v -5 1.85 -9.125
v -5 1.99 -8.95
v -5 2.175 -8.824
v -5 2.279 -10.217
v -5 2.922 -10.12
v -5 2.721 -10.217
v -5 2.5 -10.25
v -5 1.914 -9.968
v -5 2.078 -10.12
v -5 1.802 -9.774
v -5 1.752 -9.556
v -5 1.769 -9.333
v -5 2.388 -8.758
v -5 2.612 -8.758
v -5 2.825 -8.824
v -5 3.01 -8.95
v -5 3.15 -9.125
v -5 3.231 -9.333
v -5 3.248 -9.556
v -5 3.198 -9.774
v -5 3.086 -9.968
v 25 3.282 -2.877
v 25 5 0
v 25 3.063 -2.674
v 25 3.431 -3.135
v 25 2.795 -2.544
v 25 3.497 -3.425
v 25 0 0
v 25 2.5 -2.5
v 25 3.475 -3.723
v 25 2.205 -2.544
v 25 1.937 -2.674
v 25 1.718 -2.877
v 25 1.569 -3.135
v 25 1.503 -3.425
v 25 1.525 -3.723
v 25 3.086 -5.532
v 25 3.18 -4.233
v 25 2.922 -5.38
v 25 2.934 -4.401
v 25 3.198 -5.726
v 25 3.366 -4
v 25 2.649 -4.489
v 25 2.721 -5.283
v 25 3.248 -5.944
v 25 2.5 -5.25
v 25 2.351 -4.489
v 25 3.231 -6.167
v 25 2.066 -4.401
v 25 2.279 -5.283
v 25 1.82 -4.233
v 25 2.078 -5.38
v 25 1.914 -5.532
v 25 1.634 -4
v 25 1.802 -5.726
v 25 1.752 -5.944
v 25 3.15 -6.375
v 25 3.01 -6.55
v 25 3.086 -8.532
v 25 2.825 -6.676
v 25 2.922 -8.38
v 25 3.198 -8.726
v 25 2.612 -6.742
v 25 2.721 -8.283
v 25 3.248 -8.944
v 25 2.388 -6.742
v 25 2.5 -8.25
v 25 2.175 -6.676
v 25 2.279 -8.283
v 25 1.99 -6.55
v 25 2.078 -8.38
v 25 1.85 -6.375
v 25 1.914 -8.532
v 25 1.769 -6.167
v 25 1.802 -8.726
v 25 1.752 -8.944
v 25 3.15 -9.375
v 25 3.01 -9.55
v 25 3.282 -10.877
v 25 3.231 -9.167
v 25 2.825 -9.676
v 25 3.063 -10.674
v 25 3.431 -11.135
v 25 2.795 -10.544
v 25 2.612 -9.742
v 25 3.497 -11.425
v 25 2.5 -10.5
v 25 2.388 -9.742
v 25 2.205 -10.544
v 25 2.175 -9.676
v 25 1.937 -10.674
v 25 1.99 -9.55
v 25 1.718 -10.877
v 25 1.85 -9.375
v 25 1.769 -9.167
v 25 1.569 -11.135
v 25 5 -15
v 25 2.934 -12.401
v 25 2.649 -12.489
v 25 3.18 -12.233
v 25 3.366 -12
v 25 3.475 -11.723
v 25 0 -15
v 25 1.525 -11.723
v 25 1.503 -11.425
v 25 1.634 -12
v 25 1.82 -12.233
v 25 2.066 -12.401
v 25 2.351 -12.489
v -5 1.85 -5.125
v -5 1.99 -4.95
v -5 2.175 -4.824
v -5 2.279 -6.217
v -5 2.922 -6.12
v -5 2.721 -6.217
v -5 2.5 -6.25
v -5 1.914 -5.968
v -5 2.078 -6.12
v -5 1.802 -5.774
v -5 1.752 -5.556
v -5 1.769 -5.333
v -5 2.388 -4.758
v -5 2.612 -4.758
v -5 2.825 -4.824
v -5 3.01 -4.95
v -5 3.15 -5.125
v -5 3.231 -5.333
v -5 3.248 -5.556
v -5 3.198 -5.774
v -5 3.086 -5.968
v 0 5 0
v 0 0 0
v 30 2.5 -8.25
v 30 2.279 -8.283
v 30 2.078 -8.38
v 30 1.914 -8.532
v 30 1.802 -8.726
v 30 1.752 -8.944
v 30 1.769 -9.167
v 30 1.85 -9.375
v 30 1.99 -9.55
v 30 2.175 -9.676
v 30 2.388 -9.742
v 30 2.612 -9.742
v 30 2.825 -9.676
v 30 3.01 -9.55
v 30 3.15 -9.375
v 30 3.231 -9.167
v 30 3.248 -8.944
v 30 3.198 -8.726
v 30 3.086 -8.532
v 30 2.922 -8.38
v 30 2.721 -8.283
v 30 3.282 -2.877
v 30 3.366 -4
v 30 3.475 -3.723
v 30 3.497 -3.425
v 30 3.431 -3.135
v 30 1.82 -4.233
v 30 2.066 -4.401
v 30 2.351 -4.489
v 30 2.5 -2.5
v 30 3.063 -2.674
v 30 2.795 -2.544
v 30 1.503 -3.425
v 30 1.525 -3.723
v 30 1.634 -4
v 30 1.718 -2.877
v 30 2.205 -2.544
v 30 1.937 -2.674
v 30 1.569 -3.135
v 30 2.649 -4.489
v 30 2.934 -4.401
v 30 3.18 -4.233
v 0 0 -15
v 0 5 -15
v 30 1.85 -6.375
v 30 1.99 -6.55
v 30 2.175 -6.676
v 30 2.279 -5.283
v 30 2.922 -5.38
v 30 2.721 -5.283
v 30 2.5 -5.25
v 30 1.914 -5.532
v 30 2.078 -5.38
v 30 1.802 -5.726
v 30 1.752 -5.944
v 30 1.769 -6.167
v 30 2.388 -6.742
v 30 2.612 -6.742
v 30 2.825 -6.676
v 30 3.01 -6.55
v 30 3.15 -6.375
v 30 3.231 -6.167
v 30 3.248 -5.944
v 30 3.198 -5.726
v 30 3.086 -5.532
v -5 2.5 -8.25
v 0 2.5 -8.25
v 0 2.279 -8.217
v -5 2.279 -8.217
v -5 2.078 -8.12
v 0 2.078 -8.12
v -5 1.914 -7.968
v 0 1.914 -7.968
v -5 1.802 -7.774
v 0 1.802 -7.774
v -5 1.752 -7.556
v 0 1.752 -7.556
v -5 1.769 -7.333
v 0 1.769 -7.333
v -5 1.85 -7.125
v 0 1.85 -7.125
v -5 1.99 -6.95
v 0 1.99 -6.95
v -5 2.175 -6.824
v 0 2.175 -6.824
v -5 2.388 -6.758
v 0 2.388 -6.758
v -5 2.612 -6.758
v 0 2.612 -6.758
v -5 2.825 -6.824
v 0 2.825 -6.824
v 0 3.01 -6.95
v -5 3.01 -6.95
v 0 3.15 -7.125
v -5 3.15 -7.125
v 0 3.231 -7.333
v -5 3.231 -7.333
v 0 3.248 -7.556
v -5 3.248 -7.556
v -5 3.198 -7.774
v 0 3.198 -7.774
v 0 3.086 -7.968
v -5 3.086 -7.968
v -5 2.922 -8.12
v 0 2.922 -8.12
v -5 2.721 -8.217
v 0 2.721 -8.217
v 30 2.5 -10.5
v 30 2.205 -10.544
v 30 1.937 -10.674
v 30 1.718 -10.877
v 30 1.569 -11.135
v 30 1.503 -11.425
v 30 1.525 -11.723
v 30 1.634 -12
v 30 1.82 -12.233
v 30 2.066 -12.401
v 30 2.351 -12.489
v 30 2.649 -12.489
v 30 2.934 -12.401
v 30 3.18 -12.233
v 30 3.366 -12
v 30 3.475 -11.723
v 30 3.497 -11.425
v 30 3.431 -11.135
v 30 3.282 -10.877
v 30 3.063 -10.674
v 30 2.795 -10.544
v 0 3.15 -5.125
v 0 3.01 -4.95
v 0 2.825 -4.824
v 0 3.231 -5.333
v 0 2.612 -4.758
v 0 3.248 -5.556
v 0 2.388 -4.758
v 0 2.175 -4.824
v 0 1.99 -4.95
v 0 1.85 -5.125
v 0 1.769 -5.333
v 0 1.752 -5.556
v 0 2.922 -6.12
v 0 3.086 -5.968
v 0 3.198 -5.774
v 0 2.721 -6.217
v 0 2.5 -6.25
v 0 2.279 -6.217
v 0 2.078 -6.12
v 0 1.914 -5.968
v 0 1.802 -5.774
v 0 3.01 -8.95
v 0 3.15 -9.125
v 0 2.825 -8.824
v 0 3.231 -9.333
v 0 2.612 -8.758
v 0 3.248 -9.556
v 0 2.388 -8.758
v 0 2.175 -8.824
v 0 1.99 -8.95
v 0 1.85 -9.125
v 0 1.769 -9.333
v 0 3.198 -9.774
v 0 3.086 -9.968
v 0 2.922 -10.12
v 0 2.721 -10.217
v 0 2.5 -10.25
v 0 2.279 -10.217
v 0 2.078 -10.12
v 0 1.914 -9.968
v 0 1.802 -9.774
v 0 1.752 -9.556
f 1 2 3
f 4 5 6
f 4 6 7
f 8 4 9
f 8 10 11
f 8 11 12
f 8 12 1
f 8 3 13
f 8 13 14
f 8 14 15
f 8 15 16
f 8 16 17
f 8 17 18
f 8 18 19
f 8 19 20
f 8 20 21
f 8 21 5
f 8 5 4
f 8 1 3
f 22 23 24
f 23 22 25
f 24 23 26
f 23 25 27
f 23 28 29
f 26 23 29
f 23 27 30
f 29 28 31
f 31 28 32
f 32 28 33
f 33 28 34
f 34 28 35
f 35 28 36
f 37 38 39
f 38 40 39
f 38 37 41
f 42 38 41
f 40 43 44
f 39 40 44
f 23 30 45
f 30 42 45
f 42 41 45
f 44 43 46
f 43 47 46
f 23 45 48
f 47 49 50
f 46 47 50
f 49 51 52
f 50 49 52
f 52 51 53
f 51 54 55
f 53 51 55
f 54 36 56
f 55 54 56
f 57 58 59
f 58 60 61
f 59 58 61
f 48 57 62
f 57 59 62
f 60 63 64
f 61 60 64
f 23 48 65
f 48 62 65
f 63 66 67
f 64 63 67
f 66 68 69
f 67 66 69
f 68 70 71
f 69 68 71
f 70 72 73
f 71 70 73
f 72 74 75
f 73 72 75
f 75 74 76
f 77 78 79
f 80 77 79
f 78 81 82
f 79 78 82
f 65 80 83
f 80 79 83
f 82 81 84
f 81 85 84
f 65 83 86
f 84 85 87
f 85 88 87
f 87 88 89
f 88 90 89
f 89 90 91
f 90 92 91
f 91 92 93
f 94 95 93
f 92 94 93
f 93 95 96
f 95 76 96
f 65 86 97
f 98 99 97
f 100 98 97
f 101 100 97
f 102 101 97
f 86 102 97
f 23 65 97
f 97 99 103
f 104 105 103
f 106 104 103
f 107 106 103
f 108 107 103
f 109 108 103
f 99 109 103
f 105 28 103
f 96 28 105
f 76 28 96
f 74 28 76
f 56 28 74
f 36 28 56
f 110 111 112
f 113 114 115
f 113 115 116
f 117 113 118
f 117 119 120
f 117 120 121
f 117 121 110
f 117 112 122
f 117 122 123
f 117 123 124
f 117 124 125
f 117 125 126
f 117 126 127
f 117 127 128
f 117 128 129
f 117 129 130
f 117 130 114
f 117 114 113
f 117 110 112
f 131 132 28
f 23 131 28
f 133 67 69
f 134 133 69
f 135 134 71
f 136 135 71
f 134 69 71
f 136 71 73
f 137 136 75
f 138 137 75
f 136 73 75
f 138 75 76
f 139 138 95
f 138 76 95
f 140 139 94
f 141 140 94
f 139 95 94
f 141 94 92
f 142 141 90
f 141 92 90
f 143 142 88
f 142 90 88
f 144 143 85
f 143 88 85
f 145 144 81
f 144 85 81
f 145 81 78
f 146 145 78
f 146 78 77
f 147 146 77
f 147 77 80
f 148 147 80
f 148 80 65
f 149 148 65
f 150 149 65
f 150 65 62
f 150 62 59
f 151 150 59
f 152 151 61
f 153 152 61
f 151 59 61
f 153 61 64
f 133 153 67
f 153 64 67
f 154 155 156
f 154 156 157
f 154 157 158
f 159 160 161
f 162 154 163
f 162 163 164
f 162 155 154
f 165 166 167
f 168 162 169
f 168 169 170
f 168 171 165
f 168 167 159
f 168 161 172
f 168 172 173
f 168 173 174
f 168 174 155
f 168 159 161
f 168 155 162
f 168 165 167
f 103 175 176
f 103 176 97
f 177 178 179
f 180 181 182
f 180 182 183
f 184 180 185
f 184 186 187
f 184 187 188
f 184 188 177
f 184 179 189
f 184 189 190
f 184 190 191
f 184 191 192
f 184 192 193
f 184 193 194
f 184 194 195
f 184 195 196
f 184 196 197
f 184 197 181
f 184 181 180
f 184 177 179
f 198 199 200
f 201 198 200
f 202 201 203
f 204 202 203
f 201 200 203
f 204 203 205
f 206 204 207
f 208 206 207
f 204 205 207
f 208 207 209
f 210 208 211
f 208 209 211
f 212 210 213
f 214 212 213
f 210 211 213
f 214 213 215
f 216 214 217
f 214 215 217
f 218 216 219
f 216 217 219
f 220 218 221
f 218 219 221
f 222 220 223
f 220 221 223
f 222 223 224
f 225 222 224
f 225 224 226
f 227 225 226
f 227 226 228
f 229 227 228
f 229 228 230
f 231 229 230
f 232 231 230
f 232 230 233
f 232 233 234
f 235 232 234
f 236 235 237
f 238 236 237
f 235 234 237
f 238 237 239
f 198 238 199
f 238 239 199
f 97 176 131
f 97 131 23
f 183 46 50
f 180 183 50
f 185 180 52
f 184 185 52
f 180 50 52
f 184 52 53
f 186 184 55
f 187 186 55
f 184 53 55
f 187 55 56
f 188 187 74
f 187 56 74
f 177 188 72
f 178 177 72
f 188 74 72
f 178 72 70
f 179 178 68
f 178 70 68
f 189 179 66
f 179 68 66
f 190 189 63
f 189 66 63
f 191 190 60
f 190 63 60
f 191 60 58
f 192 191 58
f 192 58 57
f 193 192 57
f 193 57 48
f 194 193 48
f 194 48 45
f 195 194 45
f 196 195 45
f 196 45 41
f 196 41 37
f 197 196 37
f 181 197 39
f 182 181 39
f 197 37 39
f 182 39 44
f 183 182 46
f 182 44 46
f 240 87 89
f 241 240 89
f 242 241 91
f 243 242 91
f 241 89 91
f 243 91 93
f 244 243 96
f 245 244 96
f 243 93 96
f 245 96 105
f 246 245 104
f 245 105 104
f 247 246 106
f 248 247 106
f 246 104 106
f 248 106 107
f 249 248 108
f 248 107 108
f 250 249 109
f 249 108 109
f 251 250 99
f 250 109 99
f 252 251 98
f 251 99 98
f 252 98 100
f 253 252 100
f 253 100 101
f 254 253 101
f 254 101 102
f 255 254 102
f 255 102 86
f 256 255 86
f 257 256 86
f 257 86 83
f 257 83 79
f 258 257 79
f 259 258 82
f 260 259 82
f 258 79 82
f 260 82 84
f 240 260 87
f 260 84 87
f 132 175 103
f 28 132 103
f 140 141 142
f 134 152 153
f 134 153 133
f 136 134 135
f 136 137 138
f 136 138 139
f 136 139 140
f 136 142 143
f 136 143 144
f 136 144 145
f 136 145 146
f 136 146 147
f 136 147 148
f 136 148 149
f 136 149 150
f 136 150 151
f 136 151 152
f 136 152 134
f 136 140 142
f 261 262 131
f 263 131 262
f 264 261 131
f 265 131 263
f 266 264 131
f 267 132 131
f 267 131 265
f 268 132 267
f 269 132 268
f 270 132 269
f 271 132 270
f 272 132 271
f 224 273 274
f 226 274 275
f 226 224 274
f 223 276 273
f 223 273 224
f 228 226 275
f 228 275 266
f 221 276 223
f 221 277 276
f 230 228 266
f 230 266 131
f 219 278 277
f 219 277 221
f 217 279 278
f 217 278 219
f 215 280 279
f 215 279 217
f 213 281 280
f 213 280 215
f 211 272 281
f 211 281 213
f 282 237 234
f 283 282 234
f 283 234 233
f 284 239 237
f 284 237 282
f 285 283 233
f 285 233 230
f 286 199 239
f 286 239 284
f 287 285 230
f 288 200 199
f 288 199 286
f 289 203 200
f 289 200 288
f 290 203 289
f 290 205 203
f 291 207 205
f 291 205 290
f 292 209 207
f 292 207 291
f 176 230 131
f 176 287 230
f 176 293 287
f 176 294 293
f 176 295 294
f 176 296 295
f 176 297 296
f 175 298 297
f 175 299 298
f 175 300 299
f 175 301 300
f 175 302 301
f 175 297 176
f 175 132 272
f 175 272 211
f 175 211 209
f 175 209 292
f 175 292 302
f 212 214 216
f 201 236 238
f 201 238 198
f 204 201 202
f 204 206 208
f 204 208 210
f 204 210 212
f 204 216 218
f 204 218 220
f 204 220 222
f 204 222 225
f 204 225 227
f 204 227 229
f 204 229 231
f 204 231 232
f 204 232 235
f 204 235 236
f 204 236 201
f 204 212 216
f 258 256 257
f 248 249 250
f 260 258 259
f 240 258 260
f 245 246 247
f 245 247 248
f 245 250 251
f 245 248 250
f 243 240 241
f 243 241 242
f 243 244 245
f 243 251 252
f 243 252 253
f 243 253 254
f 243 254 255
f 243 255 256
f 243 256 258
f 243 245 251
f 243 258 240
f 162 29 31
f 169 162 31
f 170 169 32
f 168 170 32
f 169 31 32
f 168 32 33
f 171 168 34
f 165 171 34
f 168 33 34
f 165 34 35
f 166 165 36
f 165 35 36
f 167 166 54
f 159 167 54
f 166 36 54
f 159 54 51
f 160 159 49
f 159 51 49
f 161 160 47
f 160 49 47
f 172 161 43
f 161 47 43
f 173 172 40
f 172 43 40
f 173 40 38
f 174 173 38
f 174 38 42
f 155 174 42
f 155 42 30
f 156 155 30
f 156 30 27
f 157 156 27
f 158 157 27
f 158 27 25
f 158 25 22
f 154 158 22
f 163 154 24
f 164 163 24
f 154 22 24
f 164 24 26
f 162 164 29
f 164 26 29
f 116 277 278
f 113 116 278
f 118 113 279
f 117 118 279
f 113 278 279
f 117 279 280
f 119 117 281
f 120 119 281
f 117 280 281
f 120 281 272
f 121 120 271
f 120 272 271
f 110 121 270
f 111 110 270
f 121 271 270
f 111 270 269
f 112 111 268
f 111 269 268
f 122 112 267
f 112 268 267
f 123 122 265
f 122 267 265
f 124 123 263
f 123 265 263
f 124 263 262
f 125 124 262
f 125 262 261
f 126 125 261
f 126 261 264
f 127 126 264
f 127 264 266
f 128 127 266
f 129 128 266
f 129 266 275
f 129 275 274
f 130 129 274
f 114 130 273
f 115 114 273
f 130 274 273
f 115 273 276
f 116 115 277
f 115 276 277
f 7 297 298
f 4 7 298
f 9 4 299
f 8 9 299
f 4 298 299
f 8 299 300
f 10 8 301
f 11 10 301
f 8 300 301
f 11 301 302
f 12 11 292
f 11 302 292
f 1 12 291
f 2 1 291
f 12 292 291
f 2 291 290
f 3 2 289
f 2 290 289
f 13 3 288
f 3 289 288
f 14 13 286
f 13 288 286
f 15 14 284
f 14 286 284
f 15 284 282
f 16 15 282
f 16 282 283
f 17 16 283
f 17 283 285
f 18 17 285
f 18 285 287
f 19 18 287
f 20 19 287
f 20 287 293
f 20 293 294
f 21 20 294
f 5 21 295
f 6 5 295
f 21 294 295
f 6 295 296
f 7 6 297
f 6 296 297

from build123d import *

# Parameters (mm, degrees)
SKETCH1_W           = 25
SKETCH1_H           = 15
BOSS_EXTRUDE1_DEPTH = 5
SKETCH2_R           = 1
SKETCH2_R_2         = 0.75
BOSS_EXTRUDE2_DEPTH = 5
SKETCH3_R           = 0.75
BOSS_EXTRUDE3_DEPTH = 5


with BuildPart() as part:
    # Sketch1 → Boss-Extrude1 (new body)
    with BuildSketch(Plane(origin=(0, 0, 0), x_dir=(1, 0, 0), z_dir=(0, 1, 0))):
        with Locations((12.5, 7.5)):
            Rectangle(SKETCH1_W, SKETCH1_H)
    extrude(amount=BOSS_EXTRUDE1_DEPTH)

    # Sketch2 → Boss-Extrude2 (add)
    with BuildSketch(Plane(origin=(25, 0, 0), x_dir=(0, 0, -1), z_dir=(1, 0, 0))):
        with Locations(Location((11.5, 2.5, 0), (0, 0, 180))):
            Circle(SKETCH2_R)
        with Locations(Location((6, 2.5, 0), (0, 0, 180))):
            Circle(SKETCH2_R_2)
        with Locations(Location((9, 2.5, 0), (0, 0, 180))):
            Circle(SKETCH2_R_2)
        with Locations(Location((3.5, 2.5, 0), (0, 0, 180))):
            Circle(SKETCH2_R)
    extrude(amount=BOSS_EXTRUDE2_DEPTH)

    # Sketch3 → Boss-Extrude3 (add)
    with BuildSketch(Plane.ZY):
        with Locations(Location((-9.5, 2.5, 0), (0, 0, 180))):
            Circle(SKETCH3_R)
        with Locations(Location((-7.5, 2.5, 0), (0, 0, 180))):
            Circle(SKETCH3_R)
        with Locations(Location((-5.5, 2.5, 0), (0, 0, 180))):
            Circle(SKETCH3_R)
    extrude(amount=BOSS_EXTRUDE3_DEPTH)


solid = part.part
